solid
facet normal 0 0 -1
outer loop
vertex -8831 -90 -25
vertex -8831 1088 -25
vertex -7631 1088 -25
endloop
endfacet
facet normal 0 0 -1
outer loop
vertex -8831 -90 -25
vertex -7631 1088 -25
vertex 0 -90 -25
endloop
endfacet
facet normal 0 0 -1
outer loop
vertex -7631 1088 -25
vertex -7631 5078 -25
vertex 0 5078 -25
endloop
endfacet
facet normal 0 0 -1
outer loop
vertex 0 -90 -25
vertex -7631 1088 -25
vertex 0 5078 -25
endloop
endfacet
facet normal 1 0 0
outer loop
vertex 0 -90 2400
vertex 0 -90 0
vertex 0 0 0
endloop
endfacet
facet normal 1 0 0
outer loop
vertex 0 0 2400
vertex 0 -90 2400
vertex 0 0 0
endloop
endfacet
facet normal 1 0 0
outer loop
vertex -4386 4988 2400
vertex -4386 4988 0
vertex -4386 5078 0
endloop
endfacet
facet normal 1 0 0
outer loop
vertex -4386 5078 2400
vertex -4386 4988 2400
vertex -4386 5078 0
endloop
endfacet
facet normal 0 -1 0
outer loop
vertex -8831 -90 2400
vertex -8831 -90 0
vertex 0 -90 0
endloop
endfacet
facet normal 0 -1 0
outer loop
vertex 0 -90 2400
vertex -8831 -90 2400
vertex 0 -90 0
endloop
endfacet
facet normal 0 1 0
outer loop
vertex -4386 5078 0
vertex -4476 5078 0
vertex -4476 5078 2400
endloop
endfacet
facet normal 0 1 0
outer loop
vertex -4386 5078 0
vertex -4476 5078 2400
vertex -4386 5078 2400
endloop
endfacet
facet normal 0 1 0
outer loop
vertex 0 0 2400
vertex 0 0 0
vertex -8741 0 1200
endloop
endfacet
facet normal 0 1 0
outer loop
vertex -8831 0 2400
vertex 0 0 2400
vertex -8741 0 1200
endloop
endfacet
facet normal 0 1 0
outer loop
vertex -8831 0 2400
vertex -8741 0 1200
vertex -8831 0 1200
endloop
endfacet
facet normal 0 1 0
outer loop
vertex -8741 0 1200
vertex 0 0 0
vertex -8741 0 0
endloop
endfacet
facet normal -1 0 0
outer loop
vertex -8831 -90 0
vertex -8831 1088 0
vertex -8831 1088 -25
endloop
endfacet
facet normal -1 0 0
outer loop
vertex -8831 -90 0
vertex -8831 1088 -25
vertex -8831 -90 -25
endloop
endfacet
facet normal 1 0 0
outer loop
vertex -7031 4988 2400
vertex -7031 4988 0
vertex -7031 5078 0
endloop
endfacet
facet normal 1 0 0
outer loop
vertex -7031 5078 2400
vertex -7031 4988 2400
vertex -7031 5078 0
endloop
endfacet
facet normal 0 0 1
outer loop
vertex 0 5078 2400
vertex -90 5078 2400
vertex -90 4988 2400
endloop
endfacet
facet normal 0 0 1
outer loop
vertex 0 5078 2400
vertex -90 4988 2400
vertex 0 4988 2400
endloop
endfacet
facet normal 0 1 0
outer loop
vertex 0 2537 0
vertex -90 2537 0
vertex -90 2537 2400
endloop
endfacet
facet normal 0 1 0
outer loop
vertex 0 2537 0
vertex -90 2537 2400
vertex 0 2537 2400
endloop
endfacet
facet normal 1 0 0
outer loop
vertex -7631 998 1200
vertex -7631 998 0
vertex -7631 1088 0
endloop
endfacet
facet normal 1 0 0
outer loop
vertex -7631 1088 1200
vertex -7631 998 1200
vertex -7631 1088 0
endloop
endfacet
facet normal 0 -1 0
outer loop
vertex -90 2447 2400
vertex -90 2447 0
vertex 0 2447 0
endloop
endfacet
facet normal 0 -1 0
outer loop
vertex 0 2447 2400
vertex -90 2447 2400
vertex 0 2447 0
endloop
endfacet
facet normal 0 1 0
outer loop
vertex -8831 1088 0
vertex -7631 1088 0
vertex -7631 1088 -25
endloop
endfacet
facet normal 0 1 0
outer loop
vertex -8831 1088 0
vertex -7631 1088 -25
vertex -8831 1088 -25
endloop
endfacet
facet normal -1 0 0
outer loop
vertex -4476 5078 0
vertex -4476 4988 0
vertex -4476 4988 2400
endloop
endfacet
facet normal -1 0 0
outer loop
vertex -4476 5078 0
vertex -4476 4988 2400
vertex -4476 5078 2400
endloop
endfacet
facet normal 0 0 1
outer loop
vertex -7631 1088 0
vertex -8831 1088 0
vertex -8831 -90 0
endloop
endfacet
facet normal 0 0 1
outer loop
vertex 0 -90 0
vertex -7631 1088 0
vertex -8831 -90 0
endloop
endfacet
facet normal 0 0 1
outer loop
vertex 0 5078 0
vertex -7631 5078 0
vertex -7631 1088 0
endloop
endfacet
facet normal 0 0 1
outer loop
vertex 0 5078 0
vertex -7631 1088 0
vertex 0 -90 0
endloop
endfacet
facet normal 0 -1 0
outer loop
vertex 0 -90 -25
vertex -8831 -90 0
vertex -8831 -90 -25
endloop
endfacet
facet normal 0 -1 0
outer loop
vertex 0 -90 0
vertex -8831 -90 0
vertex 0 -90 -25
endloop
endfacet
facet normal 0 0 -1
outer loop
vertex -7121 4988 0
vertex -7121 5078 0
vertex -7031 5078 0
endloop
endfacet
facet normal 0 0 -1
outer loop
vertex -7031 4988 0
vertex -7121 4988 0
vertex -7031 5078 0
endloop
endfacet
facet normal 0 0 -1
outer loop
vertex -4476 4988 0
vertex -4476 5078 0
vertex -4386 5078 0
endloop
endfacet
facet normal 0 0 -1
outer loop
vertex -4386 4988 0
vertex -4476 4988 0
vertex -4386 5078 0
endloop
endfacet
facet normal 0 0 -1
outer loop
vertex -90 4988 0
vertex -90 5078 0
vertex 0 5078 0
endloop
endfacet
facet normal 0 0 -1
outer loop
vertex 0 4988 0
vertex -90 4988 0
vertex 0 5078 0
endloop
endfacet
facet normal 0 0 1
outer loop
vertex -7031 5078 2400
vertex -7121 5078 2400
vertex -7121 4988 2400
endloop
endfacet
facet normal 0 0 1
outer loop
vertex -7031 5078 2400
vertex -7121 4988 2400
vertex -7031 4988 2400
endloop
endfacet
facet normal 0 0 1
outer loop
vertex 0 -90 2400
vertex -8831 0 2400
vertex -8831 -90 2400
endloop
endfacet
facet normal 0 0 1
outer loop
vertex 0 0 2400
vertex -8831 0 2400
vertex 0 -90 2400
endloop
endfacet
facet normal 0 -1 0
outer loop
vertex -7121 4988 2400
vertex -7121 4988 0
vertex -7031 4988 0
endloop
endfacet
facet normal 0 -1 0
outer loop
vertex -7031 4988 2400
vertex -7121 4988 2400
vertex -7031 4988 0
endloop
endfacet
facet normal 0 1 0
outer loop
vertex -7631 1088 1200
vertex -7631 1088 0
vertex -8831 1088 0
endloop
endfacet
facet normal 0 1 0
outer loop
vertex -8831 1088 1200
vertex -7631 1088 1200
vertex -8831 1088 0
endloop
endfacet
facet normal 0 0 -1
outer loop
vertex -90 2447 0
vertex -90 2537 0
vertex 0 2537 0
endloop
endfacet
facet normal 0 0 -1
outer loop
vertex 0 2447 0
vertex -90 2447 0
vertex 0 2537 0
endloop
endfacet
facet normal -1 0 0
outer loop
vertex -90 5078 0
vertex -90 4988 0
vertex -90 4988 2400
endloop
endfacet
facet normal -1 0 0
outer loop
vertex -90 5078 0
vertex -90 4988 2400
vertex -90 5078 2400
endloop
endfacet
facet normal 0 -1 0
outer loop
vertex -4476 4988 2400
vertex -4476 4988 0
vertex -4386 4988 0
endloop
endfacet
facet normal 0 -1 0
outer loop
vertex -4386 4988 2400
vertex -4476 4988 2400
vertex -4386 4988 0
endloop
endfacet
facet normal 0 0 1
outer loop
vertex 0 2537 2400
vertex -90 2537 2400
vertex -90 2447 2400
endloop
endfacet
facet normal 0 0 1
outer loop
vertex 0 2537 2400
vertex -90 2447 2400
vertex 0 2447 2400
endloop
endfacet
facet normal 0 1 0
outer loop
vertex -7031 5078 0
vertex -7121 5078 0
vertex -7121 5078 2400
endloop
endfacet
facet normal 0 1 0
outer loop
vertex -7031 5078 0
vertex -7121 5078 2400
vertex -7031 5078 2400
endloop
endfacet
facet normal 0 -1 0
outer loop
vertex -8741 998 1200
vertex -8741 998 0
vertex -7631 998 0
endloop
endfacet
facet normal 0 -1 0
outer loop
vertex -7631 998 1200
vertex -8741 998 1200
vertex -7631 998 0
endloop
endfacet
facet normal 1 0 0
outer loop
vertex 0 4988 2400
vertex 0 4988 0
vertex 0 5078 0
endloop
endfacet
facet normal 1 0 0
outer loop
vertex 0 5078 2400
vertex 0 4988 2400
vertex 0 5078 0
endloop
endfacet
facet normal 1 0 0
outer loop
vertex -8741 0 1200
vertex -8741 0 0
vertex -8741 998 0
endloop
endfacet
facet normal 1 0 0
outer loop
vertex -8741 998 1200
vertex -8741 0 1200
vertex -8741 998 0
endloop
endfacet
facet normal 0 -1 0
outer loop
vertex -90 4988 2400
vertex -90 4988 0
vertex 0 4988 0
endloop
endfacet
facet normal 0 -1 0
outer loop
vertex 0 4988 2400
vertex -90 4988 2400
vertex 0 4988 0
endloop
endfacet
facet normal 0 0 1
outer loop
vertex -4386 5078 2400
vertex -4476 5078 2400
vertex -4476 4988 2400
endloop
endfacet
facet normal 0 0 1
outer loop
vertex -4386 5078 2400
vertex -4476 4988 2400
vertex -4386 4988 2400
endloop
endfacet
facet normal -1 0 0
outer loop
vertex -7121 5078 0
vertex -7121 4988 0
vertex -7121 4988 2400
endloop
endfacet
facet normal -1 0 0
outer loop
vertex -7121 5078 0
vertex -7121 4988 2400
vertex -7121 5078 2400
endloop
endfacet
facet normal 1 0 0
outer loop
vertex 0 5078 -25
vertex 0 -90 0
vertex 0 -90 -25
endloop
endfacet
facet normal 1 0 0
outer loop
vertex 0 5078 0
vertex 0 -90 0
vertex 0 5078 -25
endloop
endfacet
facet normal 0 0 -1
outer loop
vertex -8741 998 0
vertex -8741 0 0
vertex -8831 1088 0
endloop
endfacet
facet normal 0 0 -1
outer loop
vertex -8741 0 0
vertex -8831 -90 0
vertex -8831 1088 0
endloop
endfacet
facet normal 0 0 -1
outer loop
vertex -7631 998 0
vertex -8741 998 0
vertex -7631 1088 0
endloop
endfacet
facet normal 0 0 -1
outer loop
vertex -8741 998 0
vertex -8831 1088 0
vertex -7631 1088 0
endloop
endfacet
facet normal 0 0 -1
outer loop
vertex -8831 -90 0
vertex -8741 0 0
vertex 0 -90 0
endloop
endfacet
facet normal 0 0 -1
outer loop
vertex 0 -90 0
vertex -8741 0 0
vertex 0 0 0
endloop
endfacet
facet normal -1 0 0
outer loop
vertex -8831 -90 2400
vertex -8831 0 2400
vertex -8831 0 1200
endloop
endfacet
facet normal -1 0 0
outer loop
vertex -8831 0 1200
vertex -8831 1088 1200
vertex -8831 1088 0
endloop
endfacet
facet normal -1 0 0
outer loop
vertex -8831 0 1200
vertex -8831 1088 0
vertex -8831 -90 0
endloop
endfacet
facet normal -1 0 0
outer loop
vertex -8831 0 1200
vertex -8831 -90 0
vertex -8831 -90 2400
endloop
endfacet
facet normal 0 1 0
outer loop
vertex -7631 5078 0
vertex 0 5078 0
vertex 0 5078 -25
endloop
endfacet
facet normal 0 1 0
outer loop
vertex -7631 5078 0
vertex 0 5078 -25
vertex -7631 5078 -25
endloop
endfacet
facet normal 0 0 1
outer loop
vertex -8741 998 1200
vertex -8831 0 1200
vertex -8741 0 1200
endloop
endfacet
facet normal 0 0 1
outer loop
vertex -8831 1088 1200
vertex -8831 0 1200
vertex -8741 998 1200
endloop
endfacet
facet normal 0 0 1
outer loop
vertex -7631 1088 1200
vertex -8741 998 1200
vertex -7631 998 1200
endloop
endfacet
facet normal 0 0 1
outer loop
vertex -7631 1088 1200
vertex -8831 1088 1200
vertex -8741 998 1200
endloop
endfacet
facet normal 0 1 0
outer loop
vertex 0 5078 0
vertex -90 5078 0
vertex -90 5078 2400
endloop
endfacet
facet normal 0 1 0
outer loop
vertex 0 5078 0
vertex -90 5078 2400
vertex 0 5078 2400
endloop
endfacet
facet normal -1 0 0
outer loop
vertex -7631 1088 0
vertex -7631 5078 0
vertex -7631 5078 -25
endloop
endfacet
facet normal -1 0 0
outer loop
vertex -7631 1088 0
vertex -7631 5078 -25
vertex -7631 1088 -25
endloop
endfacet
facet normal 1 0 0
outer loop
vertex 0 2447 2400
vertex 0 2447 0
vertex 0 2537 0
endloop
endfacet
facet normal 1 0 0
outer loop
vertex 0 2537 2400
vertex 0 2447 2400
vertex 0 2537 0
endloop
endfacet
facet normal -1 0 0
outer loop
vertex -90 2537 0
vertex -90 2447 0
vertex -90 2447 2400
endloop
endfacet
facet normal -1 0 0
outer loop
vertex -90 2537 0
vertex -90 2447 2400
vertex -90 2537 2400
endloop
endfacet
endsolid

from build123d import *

# Parameters (mm, degrees)
F1_DEPTH = 1200
F2_DEPTH = 2400
F0_W     = 90
F0_H     = 90
F3_DEPTH = 2400
F4_DEPTH = 25


with BuildPart() as f1:
    # F0 (on Top) → F1 (new body)
    with BuildSketch(Plane.XY):
        Polygon((-8831, 0), (-8741, 0), (-8741, 998), (-7631, 998), (-7631, 1088), (-8831, 1088), (-8831, 998), align=None)
    extrude(amount=F1_DEPTH)

    # F0 (on Top) → F2 (join)
    with BuildSketch(Plane.XY):
        Polygon((0, -90), (0, 0), (-8741, 0), (-8831, 0), (-8831, -90), align=None)
    extrude(amount=F2_DEPTH)


with BuildPart() as f3:
    # F0 (on Top) → F3 (new body)
    with BuildSketch(Plane.XY):
        with Locations((-45, 2492)):
            Rectangle(F0_W, F0_H)
        with Locations((-45, 5033)):
            Rectangle(F0_W, F0_H)
        with Locations((-4431, 5033)):
            Rectangle(F0_W, F0_H)
        with Locations((-7076, 5033)):
            Rectangle(F0_W, F0_H)
    extrude(amount=F3_DEPTH)


with BuildPart() as f4:
    # F0 (on Top) → F4 (new body)
    with BuildSketch(Plane.XY):
        Polygon((0, 0), (0, 2447), (-90, 2447), (-90, 2537), (0, 2537), (0, 4988), (-90, 4988), (-90, 5078), (-4386, 5078), (-4386, 4988), (-4476, 4988), (-4476, 5078), (-7031, 5078), (-7031, 4988), (-7121, 4988), (-7121, 5078), (-7631, 5078), (-7631, 1088), (-7631, 998), (-8741, 998), (-8741, 0), align=None)
        Polygon((0, -90), (0, 0), (-8741, 0), (-8831, 0), (-8831, -90), align=None)
        Polygon((-8831, 0), (-8741, 0), (-8741, 998), (-7631, 998), (-7631, 1088), (-8831, 1088), (-8831, 998), align=None)
        with Locations((-7076, 5033)):
            Rectangle(F0_W, F0_H)
        with Locations((-4431, 5033)):
            Rectangle(F0_W, F0_H)
        with Locations((-45, 5033)):
            Rectangle(F0_W, F0_H)
        with Locations((-45, 2492)):
            Rectangle(F0_W, F0_H)
    extrude(amount=-F4_DEPTH)


solid = Compound([f1.part, f3.part, f4.part])
